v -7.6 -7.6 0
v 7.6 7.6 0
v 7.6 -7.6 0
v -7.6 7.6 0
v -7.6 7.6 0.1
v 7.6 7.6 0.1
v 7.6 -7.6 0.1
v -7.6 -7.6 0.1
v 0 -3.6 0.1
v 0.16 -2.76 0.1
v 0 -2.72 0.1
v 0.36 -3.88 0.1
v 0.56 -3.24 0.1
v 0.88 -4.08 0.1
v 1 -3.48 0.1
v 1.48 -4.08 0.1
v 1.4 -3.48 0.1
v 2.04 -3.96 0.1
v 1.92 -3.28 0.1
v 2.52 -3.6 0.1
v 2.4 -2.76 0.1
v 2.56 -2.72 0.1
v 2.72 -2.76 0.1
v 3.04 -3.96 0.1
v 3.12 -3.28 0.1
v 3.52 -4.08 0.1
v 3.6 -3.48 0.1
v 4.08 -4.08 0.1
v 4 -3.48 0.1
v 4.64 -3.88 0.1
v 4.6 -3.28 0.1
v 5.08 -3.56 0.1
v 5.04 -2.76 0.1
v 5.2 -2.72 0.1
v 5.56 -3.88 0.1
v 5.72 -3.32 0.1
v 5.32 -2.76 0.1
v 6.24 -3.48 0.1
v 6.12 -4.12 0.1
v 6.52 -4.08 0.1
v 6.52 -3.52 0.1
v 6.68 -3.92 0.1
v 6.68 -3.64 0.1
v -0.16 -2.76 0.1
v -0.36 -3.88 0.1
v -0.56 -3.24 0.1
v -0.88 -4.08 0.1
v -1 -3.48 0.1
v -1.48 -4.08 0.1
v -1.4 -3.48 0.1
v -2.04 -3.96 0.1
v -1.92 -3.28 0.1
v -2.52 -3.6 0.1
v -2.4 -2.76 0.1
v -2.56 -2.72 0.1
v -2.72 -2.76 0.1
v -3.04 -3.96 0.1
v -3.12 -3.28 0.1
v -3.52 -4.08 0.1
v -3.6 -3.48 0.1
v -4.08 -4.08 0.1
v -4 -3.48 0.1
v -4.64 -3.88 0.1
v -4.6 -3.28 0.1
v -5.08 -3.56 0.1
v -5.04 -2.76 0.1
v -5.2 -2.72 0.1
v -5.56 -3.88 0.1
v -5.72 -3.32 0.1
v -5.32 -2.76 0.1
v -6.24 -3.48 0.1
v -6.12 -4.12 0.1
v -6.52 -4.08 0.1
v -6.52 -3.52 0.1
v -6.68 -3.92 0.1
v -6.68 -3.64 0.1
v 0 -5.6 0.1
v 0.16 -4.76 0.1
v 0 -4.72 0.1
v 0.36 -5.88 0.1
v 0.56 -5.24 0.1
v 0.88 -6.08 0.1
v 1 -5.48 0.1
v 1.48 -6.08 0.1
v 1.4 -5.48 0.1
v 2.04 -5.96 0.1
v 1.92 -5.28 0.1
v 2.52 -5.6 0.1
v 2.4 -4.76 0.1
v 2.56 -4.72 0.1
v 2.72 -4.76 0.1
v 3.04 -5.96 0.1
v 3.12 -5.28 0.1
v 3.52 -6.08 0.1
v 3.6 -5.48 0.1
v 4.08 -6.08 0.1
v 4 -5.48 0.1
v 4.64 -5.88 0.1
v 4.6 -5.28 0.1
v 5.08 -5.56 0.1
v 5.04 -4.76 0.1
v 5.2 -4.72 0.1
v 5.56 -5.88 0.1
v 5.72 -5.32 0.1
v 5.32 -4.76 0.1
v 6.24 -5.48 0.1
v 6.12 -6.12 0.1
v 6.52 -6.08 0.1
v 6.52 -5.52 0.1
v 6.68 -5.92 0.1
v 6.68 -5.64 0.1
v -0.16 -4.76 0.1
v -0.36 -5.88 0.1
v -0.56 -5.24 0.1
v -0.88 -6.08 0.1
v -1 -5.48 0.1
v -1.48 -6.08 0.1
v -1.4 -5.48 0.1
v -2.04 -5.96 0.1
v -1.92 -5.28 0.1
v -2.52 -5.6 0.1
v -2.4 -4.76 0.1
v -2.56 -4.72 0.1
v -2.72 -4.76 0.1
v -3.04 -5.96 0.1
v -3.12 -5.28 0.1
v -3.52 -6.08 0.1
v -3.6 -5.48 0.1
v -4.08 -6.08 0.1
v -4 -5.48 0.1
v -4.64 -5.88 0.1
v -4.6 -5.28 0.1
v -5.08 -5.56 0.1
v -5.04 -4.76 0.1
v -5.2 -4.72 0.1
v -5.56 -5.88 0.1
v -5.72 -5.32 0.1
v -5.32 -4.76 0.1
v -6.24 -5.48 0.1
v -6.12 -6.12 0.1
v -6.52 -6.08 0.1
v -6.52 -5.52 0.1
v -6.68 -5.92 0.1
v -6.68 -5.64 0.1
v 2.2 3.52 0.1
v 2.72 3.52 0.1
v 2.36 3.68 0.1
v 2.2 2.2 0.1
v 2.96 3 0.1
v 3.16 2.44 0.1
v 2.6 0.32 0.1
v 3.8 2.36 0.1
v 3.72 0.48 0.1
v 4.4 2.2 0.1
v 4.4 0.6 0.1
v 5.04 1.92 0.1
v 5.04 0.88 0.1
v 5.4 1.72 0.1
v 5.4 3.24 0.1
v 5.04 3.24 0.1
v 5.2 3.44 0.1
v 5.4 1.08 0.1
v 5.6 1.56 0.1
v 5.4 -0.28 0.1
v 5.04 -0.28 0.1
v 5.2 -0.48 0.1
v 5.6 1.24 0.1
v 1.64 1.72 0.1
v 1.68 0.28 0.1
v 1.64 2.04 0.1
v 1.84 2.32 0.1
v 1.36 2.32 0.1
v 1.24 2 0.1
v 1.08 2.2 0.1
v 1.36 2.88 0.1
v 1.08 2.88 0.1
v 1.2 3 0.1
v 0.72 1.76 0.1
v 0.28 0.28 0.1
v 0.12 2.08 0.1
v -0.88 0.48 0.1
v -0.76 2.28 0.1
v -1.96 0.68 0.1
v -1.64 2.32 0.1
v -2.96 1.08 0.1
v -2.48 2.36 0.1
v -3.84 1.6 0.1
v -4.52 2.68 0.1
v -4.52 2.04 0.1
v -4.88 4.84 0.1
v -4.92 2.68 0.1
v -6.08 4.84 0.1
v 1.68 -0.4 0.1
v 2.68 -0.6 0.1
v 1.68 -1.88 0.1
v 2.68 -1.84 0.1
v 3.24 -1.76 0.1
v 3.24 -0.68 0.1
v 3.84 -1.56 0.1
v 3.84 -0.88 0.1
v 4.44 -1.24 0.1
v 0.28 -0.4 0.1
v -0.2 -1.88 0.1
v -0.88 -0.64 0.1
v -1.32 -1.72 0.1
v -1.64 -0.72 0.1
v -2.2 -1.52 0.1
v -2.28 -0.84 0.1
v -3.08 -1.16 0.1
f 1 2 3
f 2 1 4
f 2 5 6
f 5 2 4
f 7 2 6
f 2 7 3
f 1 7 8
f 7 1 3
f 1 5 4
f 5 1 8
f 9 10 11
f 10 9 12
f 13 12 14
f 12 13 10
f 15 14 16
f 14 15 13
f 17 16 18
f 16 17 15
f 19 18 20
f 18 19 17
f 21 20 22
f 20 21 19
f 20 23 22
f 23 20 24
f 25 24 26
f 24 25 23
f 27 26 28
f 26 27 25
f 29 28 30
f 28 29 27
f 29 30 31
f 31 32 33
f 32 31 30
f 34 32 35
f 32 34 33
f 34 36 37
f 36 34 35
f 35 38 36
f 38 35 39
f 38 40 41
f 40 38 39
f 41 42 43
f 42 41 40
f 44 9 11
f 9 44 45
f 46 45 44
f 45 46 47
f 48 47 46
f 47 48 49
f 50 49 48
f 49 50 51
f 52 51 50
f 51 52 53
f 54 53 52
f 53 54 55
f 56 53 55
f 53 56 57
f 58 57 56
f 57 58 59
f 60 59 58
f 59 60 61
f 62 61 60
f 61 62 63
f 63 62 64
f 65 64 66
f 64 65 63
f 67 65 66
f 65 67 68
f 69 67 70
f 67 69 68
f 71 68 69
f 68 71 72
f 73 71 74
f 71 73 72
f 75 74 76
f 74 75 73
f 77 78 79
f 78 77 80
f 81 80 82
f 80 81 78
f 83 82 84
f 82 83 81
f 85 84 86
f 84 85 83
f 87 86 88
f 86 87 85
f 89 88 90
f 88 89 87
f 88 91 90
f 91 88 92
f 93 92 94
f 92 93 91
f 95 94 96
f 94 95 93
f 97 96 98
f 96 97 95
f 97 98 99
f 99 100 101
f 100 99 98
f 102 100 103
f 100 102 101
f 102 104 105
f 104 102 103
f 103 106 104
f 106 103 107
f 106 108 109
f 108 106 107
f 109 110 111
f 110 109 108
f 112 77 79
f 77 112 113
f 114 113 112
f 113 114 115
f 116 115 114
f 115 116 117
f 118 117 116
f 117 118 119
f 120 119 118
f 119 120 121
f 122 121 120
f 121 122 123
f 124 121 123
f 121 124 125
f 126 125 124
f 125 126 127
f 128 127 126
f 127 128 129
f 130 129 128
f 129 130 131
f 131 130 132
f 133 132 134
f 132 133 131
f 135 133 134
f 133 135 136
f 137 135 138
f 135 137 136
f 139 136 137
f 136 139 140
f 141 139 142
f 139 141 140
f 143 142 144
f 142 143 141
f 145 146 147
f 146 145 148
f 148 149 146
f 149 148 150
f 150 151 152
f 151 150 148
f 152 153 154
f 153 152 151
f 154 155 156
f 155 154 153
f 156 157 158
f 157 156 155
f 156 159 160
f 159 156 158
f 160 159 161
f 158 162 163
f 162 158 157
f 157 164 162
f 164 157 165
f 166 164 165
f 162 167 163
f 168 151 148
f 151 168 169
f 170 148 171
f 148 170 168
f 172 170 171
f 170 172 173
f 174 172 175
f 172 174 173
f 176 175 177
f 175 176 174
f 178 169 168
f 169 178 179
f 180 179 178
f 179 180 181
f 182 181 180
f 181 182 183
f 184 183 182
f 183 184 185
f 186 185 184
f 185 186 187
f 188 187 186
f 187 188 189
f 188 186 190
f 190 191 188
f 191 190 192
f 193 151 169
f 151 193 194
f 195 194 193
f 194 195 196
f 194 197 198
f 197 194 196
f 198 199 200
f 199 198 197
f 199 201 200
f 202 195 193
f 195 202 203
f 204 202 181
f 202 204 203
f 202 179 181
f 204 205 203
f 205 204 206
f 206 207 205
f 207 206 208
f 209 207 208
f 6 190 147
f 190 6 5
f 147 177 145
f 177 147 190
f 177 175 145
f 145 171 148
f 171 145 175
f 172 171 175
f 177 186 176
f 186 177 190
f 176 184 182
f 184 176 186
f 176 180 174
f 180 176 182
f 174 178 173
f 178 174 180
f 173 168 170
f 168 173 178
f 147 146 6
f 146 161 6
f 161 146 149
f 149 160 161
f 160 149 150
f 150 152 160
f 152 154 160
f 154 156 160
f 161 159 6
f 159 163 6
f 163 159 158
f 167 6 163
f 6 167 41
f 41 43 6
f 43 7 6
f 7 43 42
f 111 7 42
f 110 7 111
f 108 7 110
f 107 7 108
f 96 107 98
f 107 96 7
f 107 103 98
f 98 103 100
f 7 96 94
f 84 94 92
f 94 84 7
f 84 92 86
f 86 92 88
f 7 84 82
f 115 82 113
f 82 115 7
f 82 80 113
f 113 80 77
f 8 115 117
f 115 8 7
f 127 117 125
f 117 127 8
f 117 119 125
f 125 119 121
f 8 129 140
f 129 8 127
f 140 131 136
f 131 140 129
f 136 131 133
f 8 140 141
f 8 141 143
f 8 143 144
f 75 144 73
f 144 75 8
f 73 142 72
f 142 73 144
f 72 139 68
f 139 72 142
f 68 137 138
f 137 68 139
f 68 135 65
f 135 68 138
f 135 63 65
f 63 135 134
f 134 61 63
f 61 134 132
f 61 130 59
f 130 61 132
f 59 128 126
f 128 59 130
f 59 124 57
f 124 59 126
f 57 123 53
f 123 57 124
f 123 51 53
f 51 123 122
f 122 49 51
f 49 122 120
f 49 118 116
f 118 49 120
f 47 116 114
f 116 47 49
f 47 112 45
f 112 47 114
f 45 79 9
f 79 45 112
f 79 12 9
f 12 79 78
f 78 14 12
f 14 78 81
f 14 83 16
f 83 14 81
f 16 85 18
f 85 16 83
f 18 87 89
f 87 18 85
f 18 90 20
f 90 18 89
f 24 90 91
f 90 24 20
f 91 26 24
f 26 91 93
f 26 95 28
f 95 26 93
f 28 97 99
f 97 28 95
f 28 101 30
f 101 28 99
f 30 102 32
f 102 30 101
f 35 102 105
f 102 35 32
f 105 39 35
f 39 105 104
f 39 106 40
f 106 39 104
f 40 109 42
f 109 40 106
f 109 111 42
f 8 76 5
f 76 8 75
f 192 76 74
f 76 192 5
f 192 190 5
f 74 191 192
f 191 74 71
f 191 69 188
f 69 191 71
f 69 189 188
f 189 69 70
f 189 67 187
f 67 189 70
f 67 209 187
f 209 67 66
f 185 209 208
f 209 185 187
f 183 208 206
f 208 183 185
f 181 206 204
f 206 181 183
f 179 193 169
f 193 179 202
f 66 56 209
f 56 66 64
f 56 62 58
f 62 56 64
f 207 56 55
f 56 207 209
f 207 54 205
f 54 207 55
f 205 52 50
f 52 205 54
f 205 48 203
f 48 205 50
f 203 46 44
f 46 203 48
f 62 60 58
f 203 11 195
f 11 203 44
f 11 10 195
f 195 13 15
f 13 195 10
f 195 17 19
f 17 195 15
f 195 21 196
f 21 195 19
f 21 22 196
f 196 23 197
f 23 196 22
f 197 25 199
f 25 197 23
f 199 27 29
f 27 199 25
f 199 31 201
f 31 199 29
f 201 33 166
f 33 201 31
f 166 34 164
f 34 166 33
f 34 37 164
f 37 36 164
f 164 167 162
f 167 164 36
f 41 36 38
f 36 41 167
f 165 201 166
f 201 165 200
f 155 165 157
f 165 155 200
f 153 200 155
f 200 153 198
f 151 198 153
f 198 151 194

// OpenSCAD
// file: ../p/box5-12.scad
use <../lib.scad>
function ldraw_lib__box5_12() = [
// 0 Box with 5 Faces without Any Edges
// 0 Name: box5-12.dat
// 0 Author: Chris Dee [cwdee]
// 0 !LDRAW_ORG Primitive UPDATE 2009-02
// 0 !LICENSE Licensed under CC BY 4.0 : see CAreadme.txt
// 
// 0 BFC CERTIFY CCW
  [0,"BFC","CERTIFY"],
  [0,"BFC","CCW"],
// 
// 0 !HISTORY 2009-09-03 [PTadmin] Official Update 2009-02
// 
// 
// 4 16 1 1 1 1 1 -1 -1 1 -1 -1 1 1
  [4,16,1,1,1,1,1,-1,-1,1,-1,-1,1,1],
// 4 16 -1 0 1 1 0 1 1 1 1 -1 1 1
  [4,16,-1,0,1,1,0,1,1,1,1,-1,1,1],
// 4 16 -1 0 -1 -1 0 1 -1 1 1 -1 1 -1
  [4,16,-1,0,-1,-1,0,1,-1,1,1,-1,1,-1],
// 4 16 1 0 -1 -1 0 -1 -1 1 -1 1 1 -1
  [4,16,1,0,-1,-1,0,-1,-1,1,-1,1,1,-1],
// 4 16 1 0 1 1 0 -1 1 1 -1 1 1 1
  [4,16,1,0,1,1,0,-1,1,1,-1,1,1,1],
// 0
];
module ldraw_lib__box5_12(step=0, col=false, unit=2/5, alt=false, line=0.2, solid=!$preview)
    makepoly(ldraw_lib__box5_12(), step=step, col=col, unit=unit, alt=alt, line=line, solid=solid);
ldraw_lib__box5_12(line=0.2);
// main file
use <../lib.scad>
use <4650853f.scad>
function ldraw_lib__4650853g() = [
// 0 Sticker  1.9 x  1.9 with Medium Azure Seaplane and Waves on Yellow Background, Heading Right
// 0 Name: 4650853g.dat
// 0 Author: Takeshi Takahashi [RainbowDolphin]
// 0 !LDRAW_ORG Part UPDATE 2020-03
// 0 !LICENSE Licensed under CC BY 4.0 : see CAreadme.txt
// 
// 0 BFC CERTIFY CCW
  [0,"BFC","CERTIFY"],
  [0,"BFC","CCW"],
// 
// 0 !KEYWORDS Flag, Flying Club, Seaplane pier, Set 3063
// 
// 0 !HISTORY 2020-12-29 [PTadmin] Official Update 2020-03
// 
// 
// 1 16 0 0 0 -1 0 0 0 1 0 0 0 1 4650853f.dat
  [1,16,0,0,0,-1,0,0,0,1,0,0,0,1, ldraw_lib__4650853f()],
];
module ldraw_lib__4650853g(step=0, col=false, unit=2/5, alt=false, line=0.2, solid=!$preview)
    makepoly(ldraw_lib__4650853g(), step=step, col=col, unit=unit, alt=alt, line=line, solid=solid);
ldraw_lib__4650853g(line=0.2);
